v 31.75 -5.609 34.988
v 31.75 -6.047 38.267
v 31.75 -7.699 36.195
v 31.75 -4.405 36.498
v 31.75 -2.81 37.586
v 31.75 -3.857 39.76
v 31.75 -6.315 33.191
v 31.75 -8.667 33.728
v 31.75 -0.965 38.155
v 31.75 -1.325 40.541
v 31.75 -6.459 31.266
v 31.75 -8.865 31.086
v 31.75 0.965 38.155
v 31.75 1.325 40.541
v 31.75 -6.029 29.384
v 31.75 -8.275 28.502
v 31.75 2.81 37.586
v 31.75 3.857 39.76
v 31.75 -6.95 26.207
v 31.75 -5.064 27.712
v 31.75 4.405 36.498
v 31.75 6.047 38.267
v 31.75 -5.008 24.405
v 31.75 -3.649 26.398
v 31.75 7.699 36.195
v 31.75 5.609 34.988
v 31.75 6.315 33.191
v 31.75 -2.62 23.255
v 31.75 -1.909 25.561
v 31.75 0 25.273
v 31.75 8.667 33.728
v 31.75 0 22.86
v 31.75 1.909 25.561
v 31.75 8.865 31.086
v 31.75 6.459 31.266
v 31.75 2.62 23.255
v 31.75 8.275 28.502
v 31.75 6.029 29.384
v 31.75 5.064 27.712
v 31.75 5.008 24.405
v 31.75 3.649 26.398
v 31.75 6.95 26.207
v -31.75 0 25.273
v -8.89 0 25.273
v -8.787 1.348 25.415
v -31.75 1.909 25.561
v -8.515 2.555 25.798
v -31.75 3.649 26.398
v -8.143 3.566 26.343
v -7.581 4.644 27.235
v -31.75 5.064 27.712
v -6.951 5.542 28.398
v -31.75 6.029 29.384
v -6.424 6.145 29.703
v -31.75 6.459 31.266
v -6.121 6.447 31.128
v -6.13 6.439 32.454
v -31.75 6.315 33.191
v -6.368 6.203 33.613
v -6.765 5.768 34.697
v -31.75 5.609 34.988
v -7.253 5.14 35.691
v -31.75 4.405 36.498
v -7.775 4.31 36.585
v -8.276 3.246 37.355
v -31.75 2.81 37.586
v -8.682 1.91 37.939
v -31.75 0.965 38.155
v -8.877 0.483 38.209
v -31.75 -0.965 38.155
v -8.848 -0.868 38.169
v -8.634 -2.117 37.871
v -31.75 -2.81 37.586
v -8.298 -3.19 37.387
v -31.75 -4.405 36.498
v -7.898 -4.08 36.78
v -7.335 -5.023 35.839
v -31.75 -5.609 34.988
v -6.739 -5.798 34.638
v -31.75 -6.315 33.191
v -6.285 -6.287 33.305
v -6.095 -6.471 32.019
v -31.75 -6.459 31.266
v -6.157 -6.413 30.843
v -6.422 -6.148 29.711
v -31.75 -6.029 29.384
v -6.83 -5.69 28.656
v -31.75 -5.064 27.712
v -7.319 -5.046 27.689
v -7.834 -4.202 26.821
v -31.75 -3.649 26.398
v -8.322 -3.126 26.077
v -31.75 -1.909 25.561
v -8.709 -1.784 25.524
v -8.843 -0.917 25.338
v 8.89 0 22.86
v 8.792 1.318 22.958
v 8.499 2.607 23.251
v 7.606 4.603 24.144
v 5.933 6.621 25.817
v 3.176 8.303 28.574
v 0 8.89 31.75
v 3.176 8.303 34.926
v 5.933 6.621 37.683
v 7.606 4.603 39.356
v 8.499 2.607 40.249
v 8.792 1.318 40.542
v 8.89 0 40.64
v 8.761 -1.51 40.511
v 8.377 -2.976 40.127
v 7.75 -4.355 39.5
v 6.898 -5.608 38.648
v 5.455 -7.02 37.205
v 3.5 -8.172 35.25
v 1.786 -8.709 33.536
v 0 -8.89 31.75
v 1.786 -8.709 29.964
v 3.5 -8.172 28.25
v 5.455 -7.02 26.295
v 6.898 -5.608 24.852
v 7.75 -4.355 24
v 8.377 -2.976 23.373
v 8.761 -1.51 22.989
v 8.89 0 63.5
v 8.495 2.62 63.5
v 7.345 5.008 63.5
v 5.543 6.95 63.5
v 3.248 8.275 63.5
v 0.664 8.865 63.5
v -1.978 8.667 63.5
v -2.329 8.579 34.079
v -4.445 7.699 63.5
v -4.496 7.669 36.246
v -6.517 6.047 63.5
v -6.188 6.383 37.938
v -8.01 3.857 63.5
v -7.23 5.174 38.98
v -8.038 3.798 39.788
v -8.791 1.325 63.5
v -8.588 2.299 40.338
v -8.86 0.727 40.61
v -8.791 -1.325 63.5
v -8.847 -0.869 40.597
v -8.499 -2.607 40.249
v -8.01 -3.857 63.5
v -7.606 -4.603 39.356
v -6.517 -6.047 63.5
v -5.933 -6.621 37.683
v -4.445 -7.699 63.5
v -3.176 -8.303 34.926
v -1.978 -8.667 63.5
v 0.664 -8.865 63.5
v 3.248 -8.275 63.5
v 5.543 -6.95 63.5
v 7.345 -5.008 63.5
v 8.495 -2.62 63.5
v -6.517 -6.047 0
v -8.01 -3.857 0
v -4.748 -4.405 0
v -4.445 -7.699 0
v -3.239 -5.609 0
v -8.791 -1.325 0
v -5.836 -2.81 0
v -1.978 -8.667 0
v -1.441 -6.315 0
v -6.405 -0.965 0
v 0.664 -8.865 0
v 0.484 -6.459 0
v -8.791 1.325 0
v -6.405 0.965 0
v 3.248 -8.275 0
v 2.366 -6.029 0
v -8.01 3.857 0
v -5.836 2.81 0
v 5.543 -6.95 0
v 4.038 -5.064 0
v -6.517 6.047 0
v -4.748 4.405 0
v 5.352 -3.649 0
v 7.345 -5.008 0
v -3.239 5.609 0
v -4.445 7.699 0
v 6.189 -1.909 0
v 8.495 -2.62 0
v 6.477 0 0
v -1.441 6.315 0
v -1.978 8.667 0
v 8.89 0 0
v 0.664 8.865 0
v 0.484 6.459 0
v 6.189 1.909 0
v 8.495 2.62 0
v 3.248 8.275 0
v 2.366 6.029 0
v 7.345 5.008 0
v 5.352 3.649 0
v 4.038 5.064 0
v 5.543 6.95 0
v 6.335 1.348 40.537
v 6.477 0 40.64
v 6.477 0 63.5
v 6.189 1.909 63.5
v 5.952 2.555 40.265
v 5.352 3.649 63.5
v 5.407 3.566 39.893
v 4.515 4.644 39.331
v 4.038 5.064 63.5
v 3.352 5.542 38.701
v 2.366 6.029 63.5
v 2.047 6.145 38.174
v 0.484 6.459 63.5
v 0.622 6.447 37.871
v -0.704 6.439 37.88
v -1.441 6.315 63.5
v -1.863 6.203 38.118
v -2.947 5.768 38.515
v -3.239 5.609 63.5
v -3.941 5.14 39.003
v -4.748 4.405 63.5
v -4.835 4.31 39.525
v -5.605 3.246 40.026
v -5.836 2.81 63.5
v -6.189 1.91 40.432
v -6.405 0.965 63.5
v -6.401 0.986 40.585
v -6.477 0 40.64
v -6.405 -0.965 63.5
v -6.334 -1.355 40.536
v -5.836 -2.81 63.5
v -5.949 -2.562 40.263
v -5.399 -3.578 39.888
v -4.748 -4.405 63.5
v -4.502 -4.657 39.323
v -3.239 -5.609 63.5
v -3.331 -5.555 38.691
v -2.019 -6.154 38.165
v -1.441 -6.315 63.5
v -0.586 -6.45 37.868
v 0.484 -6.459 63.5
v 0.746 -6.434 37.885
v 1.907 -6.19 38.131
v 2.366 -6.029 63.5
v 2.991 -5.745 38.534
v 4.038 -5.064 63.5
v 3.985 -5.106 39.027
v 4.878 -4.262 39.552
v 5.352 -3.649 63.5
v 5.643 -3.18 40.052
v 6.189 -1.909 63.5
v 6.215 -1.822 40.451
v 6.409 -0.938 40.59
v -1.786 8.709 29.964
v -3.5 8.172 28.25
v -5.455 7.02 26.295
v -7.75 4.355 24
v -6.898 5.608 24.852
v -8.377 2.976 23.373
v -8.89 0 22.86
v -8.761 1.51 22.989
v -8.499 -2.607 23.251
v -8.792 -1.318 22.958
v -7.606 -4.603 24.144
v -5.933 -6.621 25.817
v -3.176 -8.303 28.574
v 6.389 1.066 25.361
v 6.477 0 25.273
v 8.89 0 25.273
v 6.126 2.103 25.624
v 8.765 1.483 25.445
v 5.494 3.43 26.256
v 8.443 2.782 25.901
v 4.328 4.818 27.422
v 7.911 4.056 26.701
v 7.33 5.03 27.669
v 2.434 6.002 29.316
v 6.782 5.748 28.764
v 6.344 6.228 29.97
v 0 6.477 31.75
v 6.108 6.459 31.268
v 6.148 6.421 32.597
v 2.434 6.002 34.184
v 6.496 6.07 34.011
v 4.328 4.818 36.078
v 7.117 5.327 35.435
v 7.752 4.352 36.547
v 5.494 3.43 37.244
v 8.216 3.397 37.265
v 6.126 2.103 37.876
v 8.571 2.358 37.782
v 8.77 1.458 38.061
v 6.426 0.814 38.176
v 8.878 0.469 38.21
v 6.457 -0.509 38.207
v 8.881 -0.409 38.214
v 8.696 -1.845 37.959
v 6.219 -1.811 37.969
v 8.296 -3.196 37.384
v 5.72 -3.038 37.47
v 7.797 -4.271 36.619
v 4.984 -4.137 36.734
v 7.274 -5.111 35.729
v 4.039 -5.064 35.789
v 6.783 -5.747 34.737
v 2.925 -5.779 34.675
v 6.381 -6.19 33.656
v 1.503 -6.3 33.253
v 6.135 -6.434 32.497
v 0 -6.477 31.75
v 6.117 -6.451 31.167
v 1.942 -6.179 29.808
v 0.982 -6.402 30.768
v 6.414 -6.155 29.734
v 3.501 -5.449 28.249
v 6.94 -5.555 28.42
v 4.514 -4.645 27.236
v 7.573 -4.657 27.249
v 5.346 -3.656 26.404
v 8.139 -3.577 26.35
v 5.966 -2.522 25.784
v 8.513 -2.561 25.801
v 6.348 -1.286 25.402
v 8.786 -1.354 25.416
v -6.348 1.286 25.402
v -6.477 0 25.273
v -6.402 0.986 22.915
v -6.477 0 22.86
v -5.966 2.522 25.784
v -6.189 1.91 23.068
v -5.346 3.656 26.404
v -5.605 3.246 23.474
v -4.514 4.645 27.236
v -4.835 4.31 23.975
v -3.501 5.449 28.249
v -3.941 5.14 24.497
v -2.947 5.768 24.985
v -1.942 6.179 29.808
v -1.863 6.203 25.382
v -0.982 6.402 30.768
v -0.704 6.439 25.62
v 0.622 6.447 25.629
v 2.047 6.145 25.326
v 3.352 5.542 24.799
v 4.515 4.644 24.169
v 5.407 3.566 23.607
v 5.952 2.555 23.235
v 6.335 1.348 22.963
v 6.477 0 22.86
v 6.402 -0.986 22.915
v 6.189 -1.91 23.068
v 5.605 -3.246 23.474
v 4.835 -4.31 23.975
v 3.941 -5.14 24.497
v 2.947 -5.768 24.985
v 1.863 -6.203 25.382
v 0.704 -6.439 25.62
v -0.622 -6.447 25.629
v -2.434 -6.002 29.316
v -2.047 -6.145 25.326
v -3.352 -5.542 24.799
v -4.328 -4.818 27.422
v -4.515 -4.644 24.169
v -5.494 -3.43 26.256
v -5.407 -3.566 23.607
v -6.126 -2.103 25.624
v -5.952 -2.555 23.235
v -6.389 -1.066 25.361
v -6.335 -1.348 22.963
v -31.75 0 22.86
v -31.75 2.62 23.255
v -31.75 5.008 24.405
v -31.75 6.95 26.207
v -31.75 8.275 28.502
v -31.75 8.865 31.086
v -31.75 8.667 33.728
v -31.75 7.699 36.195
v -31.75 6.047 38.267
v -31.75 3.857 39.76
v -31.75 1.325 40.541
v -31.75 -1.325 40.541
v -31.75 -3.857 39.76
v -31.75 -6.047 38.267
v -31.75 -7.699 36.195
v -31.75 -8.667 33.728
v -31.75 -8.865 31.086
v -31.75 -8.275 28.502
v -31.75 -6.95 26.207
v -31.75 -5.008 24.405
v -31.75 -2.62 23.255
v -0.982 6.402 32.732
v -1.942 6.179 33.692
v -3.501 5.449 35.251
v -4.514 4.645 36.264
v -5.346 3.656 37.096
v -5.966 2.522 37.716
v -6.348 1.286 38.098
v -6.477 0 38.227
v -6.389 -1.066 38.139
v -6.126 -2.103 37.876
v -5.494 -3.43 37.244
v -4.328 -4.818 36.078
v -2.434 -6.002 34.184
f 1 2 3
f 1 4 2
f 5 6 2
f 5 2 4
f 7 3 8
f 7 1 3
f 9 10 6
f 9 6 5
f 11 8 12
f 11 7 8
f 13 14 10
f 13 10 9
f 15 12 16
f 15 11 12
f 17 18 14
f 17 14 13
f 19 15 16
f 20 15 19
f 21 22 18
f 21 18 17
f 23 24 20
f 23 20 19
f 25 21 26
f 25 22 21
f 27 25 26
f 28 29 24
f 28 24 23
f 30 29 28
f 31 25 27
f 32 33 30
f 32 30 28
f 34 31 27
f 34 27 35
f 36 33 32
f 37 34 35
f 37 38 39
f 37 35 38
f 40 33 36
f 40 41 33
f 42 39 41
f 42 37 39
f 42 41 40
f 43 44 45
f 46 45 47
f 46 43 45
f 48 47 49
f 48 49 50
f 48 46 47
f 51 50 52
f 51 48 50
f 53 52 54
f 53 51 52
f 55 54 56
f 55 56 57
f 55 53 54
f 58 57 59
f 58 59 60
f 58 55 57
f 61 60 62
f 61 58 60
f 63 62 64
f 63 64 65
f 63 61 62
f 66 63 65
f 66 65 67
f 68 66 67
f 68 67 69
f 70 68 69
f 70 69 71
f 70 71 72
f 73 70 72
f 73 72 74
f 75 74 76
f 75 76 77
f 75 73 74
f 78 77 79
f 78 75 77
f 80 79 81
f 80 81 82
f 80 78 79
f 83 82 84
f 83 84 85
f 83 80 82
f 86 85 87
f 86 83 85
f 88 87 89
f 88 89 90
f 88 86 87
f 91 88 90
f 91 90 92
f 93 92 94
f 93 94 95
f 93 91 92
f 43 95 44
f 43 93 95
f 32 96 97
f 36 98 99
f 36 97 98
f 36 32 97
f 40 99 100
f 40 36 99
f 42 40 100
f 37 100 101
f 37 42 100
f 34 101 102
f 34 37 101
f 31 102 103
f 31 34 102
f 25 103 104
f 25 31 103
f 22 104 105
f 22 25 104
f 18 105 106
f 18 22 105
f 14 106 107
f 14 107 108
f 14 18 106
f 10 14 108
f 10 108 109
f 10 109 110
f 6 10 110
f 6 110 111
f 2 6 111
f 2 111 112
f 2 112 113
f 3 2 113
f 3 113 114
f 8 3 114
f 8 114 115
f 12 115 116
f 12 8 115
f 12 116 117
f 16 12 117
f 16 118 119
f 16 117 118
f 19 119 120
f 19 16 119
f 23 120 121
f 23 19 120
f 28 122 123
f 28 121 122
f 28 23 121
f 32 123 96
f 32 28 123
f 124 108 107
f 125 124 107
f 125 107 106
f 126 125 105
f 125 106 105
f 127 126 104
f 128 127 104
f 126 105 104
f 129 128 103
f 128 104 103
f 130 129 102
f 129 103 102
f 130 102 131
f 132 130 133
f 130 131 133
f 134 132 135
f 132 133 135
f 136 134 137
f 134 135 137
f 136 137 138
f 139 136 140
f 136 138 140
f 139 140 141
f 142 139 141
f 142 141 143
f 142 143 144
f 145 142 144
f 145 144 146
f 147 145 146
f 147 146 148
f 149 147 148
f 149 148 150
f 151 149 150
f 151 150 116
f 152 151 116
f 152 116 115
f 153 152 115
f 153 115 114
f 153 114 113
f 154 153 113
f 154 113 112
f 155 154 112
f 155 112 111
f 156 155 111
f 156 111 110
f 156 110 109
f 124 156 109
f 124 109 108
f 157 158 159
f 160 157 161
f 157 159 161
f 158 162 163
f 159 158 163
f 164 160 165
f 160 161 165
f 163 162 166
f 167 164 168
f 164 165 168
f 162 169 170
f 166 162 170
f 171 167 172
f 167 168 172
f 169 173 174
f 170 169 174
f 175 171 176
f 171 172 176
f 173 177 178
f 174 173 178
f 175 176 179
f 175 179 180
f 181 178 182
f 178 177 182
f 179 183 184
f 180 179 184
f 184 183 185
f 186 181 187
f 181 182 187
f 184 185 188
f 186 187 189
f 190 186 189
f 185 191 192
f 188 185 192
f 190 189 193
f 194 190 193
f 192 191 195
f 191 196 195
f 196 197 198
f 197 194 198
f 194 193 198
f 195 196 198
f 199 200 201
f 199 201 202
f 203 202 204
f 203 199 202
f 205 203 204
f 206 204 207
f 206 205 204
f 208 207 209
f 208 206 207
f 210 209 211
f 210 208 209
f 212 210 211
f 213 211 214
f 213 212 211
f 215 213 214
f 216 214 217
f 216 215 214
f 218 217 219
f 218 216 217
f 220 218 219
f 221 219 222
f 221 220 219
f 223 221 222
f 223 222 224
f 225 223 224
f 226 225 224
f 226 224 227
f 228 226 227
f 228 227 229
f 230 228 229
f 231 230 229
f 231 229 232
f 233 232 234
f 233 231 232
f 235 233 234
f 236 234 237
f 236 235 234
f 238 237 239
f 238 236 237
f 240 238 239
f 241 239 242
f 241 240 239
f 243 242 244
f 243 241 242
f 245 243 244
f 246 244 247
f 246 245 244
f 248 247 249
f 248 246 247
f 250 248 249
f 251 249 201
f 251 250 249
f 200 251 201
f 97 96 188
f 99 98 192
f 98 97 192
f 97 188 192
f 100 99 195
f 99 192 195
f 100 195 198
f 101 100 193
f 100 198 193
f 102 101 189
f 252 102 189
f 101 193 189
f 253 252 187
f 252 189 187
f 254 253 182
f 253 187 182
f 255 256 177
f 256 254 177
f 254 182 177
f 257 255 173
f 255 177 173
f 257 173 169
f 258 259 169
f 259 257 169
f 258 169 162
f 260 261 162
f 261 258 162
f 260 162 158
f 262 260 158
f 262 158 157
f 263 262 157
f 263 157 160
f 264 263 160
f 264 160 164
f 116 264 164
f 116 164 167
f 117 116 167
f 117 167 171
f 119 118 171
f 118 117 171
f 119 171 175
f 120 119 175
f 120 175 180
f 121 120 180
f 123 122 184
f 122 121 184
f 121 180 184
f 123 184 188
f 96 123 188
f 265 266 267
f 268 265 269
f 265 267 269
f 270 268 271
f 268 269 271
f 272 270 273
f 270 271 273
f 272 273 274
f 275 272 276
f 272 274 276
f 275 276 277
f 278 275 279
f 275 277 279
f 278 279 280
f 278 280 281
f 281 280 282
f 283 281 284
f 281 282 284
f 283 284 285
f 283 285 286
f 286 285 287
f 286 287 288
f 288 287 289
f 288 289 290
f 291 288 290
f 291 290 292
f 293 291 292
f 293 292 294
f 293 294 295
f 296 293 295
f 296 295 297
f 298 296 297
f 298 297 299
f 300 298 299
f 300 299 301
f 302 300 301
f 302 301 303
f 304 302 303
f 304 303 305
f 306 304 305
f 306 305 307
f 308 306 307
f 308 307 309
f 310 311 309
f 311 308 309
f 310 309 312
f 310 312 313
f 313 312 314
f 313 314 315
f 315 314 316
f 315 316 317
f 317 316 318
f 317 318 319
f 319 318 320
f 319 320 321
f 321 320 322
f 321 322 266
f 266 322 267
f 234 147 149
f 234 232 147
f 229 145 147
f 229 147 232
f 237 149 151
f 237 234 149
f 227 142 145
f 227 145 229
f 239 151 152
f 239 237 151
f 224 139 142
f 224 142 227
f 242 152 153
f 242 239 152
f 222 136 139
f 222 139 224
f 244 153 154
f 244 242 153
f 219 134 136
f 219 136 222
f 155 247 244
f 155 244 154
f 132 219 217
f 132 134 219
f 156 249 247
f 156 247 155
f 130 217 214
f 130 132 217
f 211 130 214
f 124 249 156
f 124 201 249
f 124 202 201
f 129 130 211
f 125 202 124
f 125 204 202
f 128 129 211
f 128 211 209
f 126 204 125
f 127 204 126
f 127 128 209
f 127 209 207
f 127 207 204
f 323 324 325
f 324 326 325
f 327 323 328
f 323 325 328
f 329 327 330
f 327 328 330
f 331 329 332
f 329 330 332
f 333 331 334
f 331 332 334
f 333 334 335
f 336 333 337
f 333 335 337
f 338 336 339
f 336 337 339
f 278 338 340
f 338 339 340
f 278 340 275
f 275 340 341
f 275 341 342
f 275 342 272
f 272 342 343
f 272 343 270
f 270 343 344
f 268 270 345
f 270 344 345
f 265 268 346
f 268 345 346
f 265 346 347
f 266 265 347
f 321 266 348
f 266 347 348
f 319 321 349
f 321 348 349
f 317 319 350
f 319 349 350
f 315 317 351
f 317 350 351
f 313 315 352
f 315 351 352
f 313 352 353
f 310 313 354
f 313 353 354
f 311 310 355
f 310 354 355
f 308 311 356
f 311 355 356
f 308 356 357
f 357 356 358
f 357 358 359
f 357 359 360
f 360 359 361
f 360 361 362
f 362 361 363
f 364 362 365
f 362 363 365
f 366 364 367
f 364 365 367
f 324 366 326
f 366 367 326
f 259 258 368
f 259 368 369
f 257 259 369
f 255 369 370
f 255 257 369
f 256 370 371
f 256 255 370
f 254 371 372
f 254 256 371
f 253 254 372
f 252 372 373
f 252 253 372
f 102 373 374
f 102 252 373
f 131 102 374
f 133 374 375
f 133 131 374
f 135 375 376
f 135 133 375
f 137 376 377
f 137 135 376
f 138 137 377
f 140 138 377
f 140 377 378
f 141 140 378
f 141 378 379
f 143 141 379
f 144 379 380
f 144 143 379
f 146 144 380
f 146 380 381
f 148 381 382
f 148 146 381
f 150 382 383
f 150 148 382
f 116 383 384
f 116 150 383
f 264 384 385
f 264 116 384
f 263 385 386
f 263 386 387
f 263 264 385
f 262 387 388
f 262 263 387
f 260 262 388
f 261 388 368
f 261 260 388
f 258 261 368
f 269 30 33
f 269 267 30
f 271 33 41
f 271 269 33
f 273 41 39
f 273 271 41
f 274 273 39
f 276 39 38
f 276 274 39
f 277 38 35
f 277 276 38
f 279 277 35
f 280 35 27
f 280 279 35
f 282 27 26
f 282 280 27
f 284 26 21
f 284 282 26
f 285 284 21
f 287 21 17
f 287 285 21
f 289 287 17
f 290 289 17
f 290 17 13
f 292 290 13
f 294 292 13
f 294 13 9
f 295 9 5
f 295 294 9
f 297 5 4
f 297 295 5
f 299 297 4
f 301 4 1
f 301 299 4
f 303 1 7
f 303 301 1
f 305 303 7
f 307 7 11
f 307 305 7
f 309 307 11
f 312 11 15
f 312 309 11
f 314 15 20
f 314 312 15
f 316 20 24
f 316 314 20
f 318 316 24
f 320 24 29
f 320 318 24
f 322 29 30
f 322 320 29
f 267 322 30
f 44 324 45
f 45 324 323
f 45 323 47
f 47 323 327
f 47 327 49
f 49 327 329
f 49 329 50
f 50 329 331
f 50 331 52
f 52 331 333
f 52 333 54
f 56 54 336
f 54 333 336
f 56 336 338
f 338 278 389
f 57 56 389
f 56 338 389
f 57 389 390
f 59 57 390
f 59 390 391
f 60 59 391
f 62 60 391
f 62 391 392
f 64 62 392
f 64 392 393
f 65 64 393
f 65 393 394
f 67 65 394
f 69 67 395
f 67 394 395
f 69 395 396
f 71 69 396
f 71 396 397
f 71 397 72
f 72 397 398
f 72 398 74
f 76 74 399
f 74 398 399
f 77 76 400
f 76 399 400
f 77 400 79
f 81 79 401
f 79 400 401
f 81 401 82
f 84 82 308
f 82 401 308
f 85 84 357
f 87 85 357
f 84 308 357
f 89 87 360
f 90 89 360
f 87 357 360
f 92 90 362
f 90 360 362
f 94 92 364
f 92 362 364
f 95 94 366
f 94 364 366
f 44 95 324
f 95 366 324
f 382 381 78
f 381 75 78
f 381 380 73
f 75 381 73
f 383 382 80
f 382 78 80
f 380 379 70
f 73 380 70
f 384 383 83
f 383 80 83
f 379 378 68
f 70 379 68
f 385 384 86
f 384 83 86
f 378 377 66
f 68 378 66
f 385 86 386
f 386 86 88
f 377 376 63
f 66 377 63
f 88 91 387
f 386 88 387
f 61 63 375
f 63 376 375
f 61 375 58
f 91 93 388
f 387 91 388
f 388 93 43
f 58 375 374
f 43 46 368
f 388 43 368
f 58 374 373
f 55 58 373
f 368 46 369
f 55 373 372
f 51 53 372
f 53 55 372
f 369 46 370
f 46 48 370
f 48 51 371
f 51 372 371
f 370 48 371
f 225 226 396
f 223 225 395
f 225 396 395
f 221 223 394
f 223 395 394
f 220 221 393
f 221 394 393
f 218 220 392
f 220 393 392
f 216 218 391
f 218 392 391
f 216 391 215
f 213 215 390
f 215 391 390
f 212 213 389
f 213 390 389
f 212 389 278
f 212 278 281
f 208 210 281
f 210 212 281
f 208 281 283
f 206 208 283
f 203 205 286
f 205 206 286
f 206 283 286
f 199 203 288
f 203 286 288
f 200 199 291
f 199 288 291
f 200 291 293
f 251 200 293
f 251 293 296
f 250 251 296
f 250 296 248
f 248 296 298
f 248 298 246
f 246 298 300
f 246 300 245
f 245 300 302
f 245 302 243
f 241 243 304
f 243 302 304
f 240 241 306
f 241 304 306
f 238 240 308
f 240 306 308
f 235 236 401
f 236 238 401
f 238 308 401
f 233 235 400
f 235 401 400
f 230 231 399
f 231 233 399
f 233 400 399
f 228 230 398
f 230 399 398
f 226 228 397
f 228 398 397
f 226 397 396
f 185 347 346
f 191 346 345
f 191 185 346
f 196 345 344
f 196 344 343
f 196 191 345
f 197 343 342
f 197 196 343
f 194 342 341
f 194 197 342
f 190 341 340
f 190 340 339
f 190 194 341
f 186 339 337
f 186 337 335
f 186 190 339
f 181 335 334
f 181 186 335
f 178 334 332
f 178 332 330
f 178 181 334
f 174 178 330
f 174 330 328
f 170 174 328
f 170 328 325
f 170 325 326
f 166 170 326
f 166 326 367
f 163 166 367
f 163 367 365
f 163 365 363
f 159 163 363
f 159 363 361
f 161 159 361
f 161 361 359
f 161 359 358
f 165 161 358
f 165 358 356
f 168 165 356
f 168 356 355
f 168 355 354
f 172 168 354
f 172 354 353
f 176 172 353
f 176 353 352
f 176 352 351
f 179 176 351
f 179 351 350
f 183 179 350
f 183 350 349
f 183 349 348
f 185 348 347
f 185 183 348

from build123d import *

# Parameters (mm, degrees)
SKETCH1_R           = 8.89
SKETCH1_R_2         = 6.477
BOSS_EXTRUDE1_DEPTH = 63.5
SKETCH2_R           = 8.89
SKETCH2_R_2         = 6.477
BOSS_EXTRUDE2_DEPTH = 31.75
SKETCH4_R           = 6.477
CUT_EXTRUDE1_DEPTH  = 64.5000001
SKETCH5_R           = 6.477
CUT_EXTRUDE2_DEPTH  = 64.5000001


with BuildPart() as part:
    # Sketch1 → Boss-Extrude1 (new body)
    with BuildSketch(Plane.XY):
        Circle(SKETCH1_R)
        Circle(SKETCH1_R_2, mode=Mode.SUBTRACT)
    extrude(amount=BOSS_EXTRUDE1_DEPTH)

    # Sketch2 → Boss-Extrude2 (add, symmetric)
    with BuildSketch(Plane(origin=(0, 0, 0), x_dir=(0, 0, -1), z_dir=(1, 0, 0))):
        with Locations((-31.75, 0)):
            Circle(SKETCH2_R)
        with Locations((-31.75, 0)):
            Circle(SKETCH2_R_2, mode=Mode.SUBTRACT)
    extrude(amount=BOSS_EXTRUDE2_DEPTH, both=True)

    # Sketch4 → Cut-Extrude1 (cut, through all)
    with BuildSketch(Plane(origin=(0, 0, 0), x_dir=(-1, 0, 0), z_dir=(0, 0, -1))):
        Circle(SKETCH4_R)
    extrude(amount=-CUT_EXTRUDE1_DEPTH, mode=Mode.SUBTRACT)

    # Sketch5 → Cut-Extrude2 (cut, through all)
    with BuildSketch(Plane(origin=(31.75, 0, 0), x_dir=(0, 0, -1), z_dir=(1, 0, 0))):
        with Locations((-31.75, 0)):
            Circle(SKETCH5_R)
    extrude(amount=-CUT_EXTRUDE2_DEPTH, mode=Mode.SUBTRACT)


solid = part.part
